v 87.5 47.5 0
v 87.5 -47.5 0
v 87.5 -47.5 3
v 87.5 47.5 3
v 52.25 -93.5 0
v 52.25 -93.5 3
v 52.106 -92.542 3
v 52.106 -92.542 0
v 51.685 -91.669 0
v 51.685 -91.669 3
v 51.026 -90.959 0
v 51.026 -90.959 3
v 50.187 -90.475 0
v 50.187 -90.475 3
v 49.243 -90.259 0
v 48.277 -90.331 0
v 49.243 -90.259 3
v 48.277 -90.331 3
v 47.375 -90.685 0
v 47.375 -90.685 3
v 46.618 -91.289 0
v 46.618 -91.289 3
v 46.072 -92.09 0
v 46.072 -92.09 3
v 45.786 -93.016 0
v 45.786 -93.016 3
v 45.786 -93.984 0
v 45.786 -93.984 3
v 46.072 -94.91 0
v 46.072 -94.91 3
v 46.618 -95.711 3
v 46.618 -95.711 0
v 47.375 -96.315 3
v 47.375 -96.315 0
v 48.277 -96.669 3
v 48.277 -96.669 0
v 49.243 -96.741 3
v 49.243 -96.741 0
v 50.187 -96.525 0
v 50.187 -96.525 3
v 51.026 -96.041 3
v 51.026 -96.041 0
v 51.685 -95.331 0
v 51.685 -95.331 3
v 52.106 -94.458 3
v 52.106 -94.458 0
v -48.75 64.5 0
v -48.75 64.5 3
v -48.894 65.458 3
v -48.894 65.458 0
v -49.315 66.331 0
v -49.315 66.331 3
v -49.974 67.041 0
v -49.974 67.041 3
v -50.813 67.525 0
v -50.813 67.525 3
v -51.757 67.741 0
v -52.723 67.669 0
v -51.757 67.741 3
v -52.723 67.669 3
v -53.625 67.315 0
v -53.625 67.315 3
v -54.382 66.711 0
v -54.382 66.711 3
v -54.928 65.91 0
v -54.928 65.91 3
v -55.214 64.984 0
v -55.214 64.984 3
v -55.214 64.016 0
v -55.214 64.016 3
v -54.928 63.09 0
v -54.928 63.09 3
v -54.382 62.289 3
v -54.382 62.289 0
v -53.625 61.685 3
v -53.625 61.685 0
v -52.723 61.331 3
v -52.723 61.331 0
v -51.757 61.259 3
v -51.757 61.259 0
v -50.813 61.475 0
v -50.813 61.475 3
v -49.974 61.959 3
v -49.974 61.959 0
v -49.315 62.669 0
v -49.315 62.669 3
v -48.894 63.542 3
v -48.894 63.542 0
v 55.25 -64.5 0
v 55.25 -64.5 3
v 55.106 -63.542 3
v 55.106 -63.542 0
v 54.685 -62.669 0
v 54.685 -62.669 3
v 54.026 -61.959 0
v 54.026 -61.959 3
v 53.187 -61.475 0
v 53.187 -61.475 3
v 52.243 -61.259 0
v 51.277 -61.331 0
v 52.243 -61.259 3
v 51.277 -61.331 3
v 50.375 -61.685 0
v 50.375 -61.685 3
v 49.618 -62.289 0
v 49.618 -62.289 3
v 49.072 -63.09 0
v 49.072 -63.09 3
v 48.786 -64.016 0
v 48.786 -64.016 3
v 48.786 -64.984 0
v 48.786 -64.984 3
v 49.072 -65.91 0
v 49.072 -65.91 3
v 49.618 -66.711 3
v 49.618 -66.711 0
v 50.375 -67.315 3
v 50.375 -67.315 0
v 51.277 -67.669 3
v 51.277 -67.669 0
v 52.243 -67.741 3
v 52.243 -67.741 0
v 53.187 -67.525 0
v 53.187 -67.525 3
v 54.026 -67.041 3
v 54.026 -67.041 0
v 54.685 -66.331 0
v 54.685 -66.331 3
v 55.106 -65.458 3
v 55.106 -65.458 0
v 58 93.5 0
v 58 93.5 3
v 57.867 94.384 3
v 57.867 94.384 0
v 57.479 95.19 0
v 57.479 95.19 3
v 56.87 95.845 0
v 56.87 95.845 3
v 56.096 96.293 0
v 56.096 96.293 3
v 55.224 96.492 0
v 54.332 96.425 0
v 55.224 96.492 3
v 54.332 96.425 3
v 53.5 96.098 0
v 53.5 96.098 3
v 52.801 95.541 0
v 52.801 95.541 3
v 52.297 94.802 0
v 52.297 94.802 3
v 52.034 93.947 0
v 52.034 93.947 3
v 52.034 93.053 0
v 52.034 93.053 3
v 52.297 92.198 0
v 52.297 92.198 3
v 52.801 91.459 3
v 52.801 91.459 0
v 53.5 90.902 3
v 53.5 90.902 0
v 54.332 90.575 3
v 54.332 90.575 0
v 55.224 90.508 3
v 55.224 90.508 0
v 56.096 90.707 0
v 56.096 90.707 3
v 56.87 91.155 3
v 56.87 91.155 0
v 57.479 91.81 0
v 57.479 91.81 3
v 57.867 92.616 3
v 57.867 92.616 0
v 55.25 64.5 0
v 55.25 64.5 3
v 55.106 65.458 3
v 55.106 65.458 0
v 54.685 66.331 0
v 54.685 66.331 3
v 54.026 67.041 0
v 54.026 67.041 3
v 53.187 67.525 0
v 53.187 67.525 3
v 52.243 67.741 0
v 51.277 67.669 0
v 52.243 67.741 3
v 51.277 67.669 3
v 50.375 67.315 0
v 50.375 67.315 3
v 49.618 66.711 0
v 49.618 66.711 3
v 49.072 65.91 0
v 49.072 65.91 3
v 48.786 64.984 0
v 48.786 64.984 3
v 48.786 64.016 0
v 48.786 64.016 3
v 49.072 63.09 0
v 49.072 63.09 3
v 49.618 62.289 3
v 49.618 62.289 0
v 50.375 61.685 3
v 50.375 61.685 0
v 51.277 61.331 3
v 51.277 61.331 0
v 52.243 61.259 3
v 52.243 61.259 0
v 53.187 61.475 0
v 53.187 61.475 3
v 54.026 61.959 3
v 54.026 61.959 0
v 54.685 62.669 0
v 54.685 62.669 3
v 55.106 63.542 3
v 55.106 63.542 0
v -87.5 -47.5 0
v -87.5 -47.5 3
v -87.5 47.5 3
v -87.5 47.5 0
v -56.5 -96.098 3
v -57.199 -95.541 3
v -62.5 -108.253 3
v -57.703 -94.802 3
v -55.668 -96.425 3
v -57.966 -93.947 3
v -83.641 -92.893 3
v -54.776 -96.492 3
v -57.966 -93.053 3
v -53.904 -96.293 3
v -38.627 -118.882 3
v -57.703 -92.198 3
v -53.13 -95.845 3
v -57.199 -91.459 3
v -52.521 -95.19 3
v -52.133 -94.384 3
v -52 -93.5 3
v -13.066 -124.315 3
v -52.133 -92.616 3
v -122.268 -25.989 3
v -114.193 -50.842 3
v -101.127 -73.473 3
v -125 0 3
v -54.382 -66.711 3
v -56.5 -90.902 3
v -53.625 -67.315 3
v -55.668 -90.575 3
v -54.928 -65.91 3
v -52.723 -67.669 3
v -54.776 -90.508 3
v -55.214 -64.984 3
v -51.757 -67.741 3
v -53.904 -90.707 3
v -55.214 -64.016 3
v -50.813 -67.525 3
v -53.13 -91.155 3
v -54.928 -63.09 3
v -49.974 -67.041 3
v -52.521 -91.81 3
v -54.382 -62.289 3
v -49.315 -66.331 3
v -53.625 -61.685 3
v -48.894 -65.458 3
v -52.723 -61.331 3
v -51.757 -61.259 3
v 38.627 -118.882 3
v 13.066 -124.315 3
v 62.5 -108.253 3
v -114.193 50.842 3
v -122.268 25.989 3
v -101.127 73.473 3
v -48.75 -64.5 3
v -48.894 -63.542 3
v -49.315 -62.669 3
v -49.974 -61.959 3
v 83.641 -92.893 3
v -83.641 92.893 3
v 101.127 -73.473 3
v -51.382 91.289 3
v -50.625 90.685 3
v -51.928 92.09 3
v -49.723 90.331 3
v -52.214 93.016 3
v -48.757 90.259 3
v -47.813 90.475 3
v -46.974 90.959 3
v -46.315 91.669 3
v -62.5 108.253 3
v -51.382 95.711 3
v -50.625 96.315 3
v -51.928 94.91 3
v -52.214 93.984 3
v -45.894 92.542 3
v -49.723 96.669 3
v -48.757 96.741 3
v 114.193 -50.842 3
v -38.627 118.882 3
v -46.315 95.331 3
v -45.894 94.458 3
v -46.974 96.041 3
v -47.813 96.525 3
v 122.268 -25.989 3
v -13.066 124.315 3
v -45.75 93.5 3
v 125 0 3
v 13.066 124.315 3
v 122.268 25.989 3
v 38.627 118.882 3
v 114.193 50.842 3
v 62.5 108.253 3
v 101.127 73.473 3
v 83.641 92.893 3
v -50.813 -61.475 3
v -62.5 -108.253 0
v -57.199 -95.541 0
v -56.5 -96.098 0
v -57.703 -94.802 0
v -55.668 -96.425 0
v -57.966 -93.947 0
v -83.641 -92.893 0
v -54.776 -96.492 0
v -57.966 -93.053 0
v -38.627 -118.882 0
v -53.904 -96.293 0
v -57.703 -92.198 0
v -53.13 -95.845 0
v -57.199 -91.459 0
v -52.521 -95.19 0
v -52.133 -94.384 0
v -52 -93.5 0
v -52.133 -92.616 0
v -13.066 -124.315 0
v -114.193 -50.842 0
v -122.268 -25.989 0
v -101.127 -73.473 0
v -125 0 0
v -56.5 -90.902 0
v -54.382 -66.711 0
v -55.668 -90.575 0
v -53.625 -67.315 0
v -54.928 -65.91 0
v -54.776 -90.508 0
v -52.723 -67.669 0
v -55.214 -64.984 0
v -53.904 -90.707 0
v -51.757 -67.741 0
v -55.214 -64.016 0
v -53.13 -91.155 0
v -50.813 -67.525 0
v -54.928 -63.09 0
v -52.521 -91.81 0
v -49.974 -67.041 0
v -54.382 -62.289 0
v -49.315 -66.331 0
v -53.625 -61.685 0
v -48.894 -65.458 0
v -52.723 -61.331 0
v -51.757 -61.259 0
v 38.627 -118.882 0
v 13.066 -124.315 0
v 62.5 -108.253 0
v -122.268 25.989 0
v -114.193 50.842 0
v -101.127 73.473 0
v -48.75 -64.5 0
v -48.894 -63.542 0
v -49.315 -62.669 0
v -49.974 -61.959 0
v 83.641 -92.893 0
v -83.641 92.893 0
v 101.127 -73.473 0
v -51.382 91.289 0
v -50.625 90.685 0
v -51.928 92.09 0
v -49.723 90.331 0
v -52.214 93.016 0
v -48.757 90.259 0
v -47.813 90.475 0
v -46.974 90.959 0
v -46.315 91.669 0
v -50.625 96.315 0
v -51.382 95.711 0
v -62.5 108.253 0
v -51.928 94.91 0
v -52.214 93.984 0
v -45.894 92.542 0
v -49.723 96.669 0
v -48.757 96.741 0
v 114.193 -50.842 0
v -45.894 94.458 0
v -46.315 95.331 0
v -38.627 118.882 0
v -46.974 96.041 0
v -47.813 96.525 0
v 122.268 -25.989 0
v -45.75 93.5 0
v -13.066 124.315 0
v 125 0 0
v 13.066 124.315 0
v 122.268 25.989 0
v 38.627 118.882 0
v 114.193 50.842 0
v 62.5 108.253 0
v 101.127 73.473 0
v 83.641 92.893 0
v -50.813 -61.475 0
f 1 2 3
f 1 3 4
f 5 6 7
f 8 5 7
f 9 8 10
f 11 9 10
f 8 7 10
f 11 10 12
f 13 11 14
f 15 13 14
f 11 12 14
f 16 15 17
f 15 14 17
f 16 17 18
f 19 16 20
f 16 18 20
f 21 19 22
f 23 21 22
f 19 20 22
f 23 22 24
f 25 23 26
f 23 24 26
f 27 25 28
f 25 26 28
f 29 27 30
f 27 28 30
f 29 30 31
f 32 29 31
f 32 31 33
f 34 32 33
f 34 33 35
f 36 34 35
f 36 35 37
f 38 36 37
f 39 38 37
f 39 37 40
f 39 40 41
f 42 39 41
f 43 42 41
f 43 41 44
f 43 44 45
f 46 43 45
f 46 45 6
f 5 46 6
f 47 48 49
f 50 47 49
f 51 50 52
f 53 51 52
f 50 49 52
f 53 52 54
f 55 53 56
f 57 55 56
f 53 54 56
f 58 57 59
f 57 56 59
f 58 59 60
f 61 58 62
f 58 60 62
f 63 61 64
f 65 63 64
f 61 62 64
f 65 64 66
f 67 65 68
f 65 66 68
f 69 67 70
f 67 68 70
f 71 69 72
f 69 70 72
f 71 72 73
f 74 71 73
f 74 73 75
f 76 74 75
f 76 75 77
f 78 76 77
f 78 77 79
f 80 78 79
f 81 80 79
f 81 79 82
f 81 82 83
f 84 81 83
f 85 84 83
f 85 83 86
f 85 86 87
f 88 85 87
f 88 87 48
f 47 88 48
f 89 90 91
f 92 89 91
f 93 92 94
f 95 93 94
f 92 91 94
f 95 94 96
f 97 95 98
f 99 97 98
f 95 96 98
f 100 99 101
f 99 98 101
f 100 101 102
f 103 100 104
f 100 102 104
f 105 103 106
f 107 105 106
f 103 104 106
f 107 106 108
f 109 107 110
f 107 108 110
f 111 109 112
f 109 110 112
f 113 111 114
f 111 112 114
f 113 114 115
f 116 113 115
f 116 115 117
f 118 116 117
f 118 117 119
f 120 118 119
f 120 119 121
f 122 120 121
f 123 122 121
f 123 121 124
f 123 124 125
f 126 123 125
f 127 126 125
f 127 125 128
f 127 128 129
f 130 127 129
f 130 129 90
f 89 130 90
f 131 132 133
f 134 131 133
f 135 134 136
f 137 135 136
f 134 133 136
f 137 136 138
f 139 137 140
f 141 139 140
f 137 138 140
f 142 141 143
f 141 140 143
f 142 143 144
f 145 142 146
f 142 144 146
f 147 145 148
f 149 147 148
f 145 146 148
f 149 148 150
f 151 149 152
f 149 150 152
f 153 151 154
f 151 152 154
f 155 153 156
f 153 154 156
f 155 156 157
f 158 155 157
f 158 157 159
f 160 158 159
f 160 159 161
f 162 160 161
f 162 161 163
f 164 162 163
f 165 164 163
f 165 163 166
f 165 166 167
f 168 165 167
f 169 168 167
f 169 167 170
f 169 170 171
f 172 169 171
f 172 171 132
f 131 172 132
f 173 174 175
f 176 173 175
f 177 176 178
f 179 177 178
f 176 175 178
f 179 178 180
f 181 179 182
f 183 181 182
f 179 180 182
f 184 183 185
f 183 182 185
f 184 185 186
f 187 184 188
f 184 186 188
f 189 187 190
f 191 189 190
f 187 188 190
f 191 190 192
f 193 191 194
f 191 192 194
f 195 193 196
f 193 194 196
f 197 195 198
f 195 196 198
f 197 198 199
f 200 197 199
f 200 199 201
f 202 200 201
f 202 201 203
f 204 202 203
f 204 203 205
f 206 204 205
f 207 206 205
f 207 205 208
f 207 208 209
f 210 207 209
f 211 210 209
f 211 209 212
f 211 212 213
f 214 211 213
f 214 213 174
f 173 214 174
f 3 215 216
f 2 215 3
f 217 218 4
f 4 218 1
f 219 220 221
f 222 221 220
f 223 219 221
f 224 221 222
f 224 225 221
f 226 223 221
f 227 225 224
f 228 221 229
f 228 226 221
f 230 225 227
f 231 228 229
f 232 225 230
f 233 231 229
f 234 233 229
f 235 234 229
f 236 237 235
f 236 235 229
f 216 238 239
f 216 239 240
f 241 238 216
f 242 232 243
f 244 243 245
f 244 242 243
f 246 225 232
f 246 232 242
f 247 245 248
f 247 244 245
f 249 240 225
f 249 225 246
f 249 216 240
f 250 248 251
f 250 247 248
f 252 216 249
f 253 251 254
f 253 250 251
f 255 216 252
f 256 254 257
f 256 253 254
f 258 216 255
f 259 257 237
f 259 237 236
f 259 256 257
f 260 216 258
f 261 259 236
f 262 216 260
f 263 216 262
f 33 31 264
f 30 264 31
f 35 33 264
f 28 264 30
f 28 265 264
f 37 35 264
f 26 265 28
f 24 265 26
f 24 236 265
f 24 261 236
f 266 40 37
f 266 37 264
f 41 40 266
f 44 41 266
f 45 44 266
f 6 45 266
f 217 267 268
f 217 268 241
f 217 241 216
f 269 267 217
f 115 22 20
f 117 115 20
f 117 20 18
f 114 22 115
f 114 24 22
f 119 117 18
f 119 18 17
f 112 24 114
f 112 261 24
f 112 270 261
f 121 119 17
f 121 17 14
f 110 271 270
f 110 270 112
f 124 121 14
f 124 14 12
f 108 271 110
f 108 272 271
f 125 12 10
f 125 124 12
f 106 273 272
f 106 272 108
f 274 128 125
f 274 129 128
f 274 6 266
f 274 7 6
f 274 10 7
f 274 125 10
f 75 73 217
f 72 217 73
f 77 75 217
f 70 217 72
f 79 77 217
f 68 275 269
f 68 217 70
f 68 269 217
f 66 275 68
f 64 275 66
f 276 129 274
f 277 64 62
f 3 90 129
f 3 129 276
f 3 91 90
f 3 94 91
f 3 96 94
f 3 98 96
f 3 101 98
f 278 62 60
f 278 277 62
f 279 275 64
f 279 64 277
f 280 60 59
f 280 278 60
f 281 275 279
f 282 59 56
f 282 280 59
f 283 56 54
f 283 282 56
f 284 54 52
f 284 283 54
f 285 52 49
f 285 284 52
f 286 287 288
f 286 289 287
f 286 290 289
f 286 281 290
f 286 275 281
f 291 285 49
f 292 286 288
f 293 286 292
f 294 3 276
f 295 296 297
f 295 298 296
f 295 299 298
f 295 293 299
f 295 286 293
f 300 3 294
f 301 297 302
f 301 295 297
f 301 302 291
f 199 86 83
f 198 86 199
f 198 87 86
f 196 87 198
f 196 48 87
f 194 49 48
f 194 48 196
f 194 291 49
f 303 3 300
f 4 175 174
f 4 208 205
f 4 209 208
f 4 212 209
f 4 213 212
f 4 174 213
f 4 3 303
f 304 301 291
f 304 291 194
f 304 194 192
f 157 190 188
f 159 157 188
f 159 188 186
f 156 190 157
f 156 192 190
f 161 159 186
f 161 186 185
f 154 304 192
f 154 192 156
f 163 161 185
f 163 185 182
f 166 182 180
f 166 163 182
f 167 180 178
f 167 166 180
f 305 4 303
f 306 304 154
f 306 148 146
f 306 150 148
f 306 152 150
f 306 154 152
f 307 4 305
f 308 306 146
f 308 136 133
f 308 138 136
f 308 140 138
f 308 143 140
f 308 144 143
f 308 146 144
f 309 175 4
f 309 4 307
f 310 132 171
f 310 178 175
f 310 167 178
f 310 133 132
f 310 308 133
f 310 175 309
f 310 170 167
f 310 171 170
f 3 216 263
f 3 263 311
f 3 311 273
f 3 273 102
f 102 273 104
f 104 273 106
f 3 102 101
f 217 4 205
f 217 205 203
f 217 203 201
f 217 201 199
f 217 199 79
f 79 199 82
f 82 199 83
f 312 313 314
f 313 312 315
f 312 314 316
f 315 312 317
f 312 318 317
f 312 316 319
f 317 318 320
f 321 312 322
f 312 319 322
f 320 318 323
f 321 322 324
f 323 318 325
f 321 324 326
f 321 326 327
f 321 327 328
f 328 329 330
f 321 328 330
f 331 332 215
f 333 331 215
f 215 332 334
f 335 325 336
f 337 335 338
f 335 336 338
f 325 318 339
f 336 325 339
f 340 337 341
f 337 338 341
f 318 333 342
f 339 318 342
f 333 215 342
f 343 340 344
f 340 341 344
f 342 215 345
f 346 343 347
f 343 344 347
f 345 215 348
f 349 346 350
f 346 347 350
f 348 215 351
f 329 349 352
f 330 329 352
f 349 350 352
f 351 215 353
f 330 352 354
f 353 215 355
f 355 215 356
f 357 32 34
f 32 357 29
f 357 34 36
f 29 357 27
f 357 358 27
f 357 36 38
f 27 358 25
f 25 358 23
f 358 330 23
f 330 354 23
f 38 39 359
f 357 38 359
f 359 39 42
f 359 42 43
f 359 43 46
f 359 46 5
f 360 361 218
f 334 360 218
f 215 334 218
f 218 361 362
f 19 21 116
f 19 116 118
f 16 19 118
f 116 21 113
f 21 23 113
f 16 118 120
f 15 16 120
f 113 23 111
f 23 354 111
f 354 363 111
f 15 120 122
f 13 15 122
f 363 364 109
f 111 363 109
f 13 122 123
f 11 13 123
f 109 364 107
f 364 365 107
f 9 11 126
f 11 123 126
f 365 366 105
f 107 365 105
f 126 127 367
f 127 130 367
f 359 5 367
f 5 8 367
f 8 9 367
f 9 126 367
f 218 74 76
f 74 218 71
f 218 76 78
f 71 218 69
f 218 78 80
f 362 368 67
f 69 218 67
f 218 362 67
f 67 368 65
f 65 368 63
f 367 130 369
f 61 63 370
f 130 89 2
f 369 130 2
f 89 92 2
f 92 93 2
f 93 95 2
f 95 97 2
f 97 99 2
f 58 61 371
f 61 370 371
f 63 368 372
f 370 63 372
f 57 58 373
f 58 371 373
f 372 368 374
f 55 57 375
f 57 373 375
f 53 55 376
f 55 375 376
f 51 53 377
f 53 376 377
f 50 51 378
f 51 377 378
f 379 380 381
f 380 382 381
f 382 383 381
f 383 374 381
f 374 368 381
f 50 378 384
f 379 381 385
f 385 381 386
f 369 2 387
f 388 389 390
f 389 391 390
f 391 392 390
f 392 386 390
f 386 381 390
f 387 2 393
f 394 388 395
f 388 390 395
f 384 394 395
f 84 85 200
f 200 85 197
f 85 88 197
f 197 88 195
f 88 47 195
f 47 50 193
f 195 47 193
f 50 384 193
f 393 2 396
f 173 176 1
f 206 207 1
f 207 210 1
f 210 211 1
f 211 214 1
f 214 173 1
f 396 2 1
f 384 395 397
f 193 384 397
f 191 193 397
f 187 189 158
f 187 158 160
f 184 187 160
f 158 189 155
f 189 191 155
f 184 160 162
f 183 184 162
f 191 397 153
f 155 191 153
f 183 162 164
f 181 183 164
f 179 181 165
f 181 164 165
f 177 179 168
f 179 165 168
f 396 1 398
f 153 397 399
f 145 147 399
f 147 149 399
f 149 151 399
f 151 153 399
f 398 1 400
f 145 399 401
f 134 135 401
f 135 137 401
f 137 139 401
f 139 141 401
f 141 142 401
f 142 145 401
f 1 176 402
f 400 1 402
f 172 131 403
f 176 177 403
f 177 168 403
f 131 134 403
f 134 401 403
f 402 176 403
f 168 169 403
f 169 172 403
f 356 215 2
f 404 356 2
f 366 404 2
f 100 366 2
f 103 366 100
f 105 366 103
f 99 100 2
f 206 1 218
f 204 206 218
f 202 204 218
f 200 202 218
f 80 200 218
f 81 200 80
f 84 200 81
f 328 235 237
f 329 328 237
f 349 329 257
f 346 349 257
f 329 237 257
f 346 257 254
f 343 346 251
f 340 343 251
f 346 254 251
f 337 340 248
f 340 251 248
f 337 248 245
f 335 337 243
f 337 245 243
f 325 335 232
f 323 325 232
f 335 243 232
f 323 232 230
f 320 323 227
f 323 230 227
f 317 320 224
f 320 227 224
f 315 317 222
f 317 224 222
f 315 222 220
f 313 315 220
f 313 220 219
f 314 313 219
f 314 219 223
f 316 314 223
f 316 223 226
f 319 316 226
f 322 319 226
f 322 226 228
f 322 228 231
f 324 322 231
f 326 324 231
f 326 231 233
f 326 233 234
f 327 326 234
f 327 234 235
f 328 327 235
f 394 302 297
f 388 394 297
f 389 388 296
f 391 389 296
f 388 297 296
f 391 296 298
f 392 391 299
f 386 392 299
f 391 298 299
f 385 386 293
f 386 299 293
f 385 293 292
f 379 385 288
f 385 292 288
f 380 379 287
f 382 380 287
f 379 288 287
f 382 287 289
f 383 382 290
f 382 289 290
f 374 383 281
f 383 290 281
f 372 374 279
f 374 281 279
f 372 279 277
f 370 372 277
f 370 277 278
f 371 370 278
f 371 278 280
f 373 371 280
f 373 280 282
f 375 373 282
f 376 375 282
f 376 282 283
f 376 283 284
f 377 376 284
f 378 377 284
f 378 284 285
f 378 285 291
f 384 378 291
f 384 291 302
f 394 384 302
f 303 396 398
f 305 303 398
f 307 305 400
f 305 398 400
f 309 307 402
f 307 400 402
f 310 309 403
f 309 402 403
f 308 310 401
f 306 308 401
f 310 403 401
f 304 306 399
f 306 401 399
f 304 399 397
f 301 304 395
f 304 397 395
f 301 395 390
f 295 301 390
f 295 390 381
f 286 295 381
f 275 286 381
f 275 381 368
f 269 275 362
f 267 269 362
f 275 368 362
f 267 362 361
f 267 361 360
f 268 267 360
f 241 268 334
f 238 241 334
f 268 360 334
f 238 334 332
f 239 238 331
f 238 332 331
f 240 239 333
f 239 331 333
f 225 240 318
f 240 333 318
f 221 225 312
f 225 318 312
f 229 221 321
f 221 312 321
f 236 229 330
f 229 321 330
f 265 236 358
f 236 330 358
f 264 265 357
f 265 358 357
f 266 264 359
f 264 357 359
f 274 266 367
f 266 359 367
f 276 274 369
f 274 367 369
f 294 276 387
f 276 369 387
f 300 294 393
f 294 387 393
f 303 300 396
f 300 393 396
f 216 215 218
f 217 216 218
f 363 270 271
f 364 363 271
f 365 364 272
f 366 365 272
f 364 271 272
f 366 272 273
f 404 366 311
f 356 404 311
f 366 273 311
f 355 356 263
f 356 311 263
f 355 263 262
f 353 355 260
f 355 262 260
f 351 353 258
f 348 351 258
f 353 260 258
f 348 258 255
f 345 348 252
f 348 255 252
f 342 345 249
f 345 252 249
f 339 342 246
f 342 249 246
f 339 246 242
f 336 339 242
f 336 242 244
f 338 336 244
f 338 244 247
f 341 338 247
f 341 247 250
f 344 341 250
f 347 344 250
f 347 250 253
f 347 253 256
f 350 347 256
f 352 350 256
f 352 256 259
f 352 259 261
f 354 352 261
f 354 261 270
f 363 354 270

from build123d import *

# Parameters (mm, degrees)
SKETCH1_R           = 125
SKETCH1_W           = 175
SKETCH1_H           = 95
BOSS_EXTRUDE1_DEPTH = 3
SKETCH2_R           = 3.25
SKETCH2_R_2         = 3
CUT_EXTRUDE1_DEPTH  = 4


with BuildPart() as part:
    # Sketch1 → Boss-Extrude1 (new body)
    with BuildSketch(Plane.XY):
        Circle(SKETCH1_R)
        Rectangle(SKETCH1_W, SKETCH1_H, mode=Mode.SUBTRACT)
    extrude(amount=BOSS_EXTRUDE1_DEPTH)

    # Sketch2 → Cut-Extrude1 (cut, through all)
    with BuildSketch(Plane.XY.offset(3)):
        with Locations((-52, -64.5)):
            Circle(SKETCH2_R)
        with Locations((-55, -93.5)):
            Circle(SKETCH2_R_2)
        with Locations((52, 64.5)):
            Circle(SKETCH2_R)
        with Locations((55, 93.5)):
            Circle(SKETCH2_R_2)
        with Locations((52, -64.5)):
            Circle(SKETCH2_R)
        with Locations((-52, 64.5)):
            Circle(SKETCH2_R)
        with Locations((49, -93.5)):
            Circle(SKETCH2_R)
        with Locations((-49, 93.5)):
            Circle(SKETCH2_R)
    extrude(amount=-CUT_EXTRUDE1_DEPTH, mode=Mode.SUBTRACT)


solid = part.part
